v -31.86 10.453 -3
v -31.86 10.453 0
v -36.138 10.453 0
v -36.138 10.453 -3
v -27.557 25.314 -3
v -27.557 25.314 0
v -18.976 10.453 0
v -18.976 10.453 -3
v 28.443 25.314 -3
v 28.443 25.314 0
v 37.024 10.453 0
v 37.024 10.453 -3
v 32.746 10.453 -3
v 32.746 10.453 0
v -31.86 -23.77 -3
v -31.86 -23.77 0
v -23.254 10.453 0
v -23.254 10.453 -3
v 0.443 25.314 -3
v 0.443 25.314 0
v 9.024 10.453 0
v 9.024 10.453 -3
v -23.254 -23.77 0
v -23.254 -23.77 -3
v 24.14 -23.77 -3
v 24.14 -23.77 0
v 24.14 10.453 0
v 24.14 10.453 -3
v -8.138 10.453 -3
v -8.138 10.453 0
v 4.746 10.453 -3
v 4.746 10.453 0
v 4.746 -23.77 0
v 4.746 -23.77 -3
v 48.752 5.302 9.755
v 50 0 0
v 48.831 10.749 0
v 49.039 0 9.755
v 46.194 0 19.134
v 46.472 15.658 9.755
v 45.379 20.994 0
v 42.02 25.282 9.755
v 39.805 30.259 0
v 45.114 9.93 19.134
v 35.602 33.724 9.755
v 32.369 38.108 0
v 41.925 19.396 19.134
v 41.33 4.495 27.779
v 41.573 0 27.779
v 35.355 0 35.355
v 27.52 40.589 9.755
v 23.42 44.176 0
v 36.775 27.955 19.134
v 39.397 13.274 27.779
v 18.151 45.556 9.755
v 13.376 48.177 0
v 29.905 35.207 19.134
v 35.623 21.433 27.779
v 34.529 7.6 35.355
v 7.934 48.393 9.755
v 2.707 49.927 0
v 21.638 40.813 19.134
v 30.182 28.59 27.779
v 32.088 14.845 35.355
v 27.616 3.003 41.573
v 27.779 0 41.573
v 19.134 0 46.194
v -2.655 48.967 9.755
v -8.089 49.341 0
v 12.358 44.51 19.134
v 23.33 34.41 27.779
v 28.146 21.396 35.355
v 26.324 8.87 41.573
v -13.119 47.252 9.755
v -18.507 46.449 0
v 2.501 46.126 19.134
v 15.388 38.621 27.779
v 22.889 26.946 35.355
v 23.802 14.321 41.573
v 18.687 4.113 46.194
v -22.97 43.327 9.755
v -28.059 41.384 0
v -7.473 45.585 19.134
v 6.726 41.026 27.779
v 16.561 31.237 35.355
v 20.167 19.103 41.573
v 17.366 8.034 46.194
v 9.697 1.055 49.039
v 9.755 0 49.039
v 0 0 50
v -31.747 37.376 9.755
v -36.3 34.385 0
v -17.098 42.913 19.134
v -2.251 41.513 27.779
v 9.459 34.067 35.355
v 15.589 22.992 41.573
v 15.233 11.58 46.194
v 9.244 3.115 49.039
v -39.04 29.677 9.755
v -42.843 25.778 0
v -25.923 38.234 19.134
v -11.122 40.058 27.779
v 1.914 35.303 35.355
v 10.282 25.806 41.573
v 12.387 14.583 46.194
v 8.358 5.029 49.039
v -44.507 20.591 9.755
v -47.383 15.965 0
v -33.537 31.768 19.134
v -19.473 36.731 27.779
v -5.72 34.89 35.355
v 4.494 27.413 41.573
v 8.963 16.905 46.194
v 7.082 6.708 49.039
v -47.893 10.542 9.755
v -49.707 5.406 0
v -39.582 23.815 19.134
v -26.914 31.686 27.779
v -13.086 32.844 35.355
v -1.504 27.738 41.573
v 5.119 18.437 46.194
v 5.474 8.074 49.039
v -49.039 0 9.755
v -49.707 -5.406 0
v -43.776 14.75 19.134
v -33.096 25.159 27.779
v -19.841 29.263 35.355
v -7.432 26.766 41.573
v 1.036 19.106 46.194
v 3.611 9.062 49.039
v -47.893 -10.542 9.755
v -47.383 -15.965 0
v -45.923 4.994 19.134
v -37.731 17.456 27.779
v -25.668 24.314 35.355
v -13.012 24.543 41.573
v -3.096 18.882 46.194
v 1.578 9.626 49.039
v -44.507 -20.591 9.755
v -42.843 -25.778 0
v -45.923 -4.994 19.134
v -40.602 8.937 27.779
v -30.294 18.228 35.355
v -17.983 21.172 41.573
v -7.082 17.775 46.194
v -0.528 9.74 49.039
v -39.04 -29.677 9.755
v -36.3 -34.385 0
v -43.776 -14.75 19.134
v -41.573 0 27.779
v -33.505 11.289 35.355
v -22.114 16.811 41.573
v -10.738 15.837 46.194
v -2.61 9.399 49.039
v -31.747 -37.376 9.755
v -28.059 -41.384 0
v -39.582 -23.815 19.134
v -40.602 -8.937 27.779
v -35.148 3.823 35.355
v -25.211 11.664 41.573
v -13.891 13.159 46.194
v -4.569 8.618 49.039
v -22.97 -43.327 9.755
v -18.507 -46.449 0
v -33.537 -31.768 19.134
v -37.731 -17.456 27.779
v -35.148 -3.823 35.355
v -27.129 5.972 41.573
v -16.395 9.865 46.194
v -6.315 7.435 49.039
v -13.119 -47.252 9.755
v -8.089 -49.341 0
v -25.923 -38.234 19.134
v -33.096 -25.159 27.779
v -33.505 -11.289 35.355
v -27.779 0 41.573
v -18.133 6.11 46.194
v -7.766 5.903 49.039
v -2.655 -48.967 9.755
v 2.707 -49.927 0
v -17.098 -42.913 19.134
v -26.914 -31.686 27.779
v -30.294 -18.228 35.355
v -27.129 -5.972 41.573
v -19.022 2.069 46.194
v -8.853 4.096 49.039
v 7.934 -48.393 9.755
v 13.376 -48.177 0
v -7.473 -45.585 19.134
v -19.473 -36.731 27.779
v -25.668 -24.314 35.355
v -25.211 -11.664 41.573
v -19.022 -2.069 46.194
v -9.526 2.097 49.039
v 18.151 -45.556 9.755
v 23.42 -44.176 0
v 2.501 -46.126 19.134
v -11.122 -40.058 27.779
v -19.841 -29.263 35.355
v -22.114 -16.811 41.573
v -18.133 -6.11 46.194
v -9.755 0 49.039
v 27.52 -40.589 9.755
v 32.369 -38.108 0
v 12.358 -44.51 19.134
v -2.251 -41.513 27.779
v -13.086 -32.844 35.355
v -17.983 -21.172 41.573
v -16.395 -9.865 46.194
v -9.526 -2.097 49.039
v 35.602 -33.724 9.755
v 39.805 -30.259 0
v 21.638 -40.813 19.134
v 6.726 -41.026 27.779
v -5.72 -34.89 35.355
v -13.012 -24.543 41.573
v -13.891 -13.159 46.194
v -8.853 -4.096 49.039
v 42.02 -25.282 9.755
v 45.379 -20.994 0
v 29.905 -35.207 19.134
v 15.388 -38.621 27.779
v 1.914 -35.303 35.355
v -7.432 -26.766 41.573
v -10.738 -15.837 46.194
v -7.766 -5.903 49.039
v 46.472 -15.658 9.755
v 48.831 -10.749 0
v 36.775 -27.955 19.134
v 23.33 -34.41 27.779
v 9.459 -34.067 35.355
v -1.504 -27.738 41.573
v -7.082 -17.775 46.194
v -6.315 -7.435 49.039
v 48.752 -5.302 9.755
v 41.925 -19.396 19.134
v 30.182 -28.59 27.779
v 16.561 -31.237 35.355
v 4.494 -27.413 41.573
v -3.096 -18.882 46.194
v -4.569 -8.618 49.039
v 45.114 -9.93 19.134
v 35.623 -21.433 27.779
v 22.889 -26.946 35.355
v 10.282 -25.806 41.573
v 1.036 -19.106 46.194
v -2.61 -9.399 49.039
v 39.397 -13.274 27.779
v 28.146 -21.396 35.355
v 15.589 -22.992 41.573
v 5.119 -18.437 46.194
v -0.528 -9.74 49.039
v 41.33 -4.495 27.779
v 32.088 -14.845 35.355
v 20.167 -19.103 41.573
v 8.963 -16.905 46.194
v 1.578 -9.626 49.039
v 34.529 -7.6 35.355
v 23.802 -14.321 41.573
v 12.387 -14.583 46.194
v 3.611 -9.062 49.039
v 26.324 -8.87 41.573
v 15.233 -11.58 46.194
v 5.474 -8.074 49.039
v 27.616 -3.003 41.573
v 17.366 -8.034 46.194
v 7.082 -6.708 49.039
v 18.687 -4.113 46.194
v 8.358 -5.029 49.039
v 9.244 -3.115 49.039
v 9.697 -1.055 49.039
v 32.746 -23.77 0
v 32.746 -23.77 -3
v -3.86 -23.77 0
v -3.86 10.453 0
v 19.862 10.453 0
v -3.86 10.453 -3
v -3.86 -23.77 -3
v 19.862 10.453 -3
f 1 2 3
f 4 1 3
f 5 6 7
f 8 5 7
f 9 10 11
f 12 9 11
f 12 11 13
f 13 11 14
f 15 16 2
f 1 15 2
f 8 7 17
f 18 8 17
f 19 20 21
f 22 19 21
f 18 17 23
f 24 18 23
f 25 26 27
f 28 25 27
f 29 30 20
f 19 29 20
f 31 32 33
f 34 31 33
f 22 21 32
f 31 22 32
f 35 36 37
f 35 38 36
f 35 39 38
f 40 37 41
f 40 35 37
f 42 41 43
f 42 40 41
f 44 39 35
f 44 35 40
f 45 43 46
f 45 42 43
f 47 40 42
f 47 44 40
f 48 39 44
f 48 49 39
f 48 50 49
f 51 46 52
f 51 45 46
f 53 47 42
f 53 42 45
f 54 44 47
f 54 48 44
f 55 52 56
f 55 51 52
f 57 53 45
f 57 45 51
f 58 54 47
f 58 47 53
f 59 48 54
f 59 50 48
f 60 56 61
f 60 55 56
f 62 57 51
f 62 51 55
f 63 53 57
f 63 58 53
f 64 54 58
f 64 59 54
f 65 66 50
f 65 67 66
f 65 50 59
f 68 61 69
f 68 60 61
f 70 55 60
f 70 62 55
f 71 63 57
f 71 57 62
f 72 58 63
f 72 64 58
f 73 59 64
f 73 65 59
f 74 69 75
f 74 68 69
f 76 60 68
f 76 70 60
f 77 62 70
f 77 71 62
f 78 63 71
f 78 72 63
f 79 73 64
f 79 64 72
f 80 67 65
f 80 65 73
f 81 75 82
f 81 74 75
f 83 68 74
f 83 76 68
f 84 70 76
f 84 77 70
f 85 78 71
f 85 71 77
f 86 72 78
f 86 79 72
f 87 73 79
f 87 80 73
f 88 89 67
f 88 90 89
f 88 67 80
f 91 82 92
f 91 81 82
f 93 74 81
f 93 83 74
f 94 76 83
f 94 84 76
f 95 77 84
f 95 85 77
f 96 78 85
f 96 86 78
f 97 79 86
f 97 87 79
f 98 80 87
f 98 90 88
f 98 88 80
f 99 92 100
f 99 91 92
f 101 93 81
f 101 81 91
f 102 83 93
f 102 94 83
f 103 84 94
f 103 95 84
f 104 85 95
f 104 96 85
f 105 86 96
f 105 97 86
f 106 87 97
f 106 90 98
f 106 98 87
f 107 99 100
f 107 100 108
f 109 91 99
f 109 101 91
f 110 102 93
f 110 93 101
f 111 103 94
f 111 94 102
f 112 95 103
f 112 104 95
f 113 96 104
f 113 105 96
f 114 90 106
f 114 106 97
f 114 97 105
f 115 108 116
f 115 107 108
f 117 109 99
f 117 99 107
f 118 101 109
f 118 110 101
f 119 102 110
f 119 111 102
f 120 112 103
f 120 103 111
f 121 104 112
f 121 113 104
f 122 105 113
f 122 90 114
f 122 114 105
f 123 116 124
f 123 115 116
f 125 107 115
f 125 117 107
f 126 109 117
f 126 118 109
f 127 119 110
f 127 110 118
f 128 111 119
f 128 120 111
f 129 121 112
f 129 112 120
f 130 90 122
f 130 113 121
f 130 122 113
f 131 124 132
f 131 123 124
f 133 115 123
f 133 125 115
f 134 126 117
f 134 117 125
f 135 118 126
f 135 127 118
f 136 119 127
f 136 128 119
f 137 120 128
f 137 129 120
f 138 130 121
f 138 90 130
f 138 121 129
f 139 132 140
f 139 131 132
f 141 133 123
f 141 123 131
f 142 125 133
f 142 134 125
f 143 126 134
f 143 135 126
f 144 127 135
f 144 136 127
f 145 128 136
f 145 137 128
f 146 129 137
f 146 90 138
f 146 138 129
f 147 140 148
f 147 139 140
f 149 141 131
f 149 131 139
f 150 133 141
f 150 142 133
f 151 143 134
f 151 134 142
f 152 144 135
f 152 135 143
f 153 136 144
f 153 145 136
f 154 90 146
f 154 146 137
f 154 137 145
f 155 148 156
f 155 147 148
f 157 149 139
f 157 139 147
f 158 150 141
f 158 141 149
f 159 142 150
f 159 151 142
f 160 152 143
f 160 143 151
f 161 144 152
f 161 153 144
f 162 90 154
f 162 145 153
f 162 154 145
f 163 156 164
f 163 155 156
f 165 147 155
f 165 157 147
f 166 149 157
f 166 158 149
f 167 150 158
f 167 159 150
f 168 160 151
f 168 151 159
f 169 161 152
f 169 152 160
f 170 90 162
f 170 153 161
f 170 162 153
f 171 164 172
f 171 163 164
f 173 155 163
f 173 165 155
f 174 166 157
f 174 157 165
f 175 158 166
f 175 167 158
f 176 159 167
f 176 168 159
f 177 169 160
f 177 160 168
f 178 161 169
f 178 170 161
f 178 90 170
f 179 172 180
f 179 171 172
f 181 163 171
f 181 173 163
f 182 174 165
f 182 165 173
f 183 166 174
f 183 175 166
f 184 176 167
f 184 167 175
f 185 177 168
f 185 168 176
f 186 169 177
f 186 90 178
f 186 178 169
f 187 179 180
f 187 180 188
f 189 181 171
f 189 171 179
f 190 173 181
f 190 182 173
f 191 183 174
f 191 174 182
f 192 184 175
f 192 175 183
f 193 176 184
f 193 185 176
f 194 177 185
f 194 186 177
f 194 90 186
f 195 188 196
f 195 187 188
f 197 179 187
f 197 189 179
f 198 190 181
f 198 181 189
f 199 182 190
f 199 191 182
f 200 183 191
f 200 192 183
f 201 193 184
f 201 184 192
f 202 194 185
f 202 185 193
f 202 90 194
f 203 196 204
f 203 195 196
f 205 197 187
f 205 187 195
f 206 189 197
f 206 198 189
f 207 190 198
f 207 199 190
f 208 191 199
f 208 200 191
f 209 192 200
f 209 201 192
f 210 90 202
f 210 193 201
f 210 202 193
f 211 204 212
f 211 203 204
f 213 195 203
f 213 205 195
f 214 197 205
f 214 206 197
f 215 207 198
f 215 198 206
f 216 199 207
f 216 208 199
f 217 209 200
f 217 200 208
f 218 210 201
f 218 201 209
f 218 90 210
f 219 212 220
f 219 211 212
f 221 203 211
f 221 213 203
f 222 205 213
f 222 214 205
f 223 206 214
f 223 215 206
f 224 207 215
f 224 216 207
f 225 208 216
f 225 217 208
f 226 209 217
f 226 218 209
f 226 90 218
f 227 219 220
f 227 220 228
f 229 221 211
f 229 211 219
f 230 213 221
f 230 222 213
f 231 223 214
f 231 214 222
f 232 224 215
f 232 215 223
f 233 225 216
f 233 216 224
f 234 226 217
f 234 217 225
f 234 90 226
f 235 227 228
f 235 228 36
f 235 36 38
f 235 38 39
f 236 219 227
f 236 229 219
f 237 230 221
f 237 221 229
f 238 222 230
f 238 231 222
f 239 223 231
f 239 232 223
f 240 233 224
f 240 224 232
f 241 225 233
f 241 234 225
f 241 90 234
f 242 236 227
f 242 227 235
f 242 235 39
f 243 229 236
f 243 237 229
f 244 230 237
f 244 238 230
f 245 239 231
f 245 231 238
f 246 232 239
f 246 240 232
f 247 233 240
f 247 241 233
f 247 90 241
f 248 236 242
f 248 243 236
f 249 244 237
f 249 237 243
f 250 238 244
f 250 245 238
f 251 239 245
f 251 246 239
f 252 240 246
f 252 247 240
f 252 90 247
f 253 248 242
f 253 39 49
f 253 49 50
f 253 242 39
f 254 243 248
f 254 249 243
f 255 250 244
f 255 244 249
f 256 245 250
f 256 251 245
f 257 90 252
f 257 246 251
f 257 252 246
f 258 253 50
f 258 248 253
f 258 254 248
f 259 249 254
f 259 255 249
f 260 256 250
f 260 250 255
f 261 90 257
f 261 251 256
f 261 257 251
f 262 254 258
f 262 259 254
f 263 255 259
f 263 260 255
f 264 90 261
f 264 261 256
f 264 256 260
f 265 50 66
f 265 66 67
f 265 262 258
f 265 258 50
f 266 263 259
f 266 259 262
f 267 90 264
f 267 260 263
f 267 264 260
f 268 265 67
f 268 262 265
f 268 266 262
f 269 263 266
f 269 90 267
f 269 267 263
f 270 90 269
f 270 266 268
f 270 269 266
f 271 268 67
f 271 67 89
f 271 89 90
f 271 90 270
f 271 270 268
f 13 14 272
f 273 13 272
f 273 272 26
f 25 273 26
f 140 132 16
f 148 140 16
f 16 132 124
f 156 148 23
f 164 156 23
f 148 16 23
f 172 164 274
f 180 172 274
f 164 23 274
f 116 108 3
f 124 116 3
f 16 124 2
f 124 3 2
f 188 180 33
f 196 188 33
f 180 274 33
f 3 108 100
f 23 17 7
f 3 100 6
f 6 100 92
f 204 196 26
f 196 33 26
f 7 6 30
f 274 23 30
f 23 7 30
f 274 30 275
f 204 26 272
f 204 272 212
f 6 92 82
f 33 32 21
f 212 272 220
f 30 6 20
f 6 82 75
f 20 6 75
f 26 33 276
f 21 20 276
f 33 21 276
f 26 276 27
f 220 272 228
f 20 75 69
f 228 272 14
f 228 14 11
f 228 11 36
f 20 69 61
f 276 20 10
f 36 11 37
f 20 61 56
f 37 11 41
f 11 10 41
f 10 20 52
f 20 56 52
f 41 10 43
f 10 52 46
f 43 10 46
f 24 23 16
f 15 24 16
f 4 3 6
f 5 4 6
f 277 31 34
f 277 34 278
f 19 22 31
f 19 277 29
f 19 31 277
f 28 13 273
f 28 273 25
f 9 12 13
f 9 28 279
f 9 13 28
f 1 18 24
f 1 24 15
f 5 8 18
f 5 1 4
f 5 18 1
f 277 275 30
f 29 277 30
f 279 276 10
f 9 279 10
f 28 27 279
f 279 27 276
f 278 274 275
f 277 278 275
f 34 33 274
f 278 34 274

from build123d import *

# Parameters (mm, degrees)
EXTRUDE005_DEPTH = 3
EXTRUDE006_DEPTH = 3
RECTANGLE001_W   = 100
RECTANGLE001_H   = 100
EXTRUDE004_DEPTH = 50
EXTRUDE007_DEPTH = 3


with BuildPart() as extrude005:
    # Clone2D → Extrude005 (new body)
    with BuildSketch(Plane(origin=(-17, 30, 0), x_dir=(1, 0, 0), z_dir=(0, 0, 1))):
        Polygon((17.44346, -4.685924), (26.023636, -19.546554), (21.745595, -19.546554), (21.745595, -53.769589), (13.140465, -53.769589), (13.140465, -19.546554), (8.861994, -19.546554), align=None)
    extrude(amount=-EXTRUDE005_DEPTH)


with BuildPart() as extrude006:
    # Clone2D001 → Extrude006 (new body)
    with BuildSketch(Plane(origin=(-45, 30, 0), x_dir=(1, 0, 0), z_dir=(0, 0, 1))):
        Polygon((17.44346, -4.685924), (26.023636, -19.546554), (21.745595, -19.546554), (21.745595, -53.769589), (13.140465, -53.769589), (13.140465, -19.546554), (8.861994, -19.546554), align=None)
    extrude(amount=-EXTRUDE006_DEPTH)


with BuildPart() as extrude004:
    # Rectangle001 → Extrude004 (new body)
    with BuildSketch(Plane(origin=(-50, 50, 0), x_dir=(1, 0, 0), z_dir=(0, 0, 1))):
        with Locations((50, -50)):
            Rectangle(RECTANGLE001_W, RECTANGLE001_H)
    extrude(amount=-EXTRUDE004_DEPTH)


with BuildPart() as cut001:
    # Sphere001 → Sphere001 (revolve)
    with BuildSketch(Plane.XZ):
        with BuildLine():
            ThreePointArc((0, -50), (50, 0), (0, 50))
            Line((0, 50), (0, -50))
        make_face()
    revolve(axis=Axis((0, 0, 0), (0, 0, 1)))

    # Cut001: cut Extrude004
    add(extrude004.part, mode=Mode.SUBTRACT)


with BuildPart() as extruded_magnetization:
    # Clone2D002 → Extrude007 (new body)
    with BuildSketch(Plane(origin=(11, 30, 0), x_dir=(1, 0, 0), z_dir=(0, 0, 1))):
        Polygon((17.44346, -4.685924), (26.023636, -19.546554), (21.745595, -19.546554), (21.745595, -53.769589), (13.140465, -53.769589), (13.140465, -19.546554), (8.861994, -19.546554), align=None)
    extrude(amount=-EXTRUDE007_DEPTH)

    # Fusion003: union Extrude005, Extrude006, Cut001
    add(extrude005.part)
    add(extrude006.part)
    add(cut001.part)


solid = extruded_magnetization.part
